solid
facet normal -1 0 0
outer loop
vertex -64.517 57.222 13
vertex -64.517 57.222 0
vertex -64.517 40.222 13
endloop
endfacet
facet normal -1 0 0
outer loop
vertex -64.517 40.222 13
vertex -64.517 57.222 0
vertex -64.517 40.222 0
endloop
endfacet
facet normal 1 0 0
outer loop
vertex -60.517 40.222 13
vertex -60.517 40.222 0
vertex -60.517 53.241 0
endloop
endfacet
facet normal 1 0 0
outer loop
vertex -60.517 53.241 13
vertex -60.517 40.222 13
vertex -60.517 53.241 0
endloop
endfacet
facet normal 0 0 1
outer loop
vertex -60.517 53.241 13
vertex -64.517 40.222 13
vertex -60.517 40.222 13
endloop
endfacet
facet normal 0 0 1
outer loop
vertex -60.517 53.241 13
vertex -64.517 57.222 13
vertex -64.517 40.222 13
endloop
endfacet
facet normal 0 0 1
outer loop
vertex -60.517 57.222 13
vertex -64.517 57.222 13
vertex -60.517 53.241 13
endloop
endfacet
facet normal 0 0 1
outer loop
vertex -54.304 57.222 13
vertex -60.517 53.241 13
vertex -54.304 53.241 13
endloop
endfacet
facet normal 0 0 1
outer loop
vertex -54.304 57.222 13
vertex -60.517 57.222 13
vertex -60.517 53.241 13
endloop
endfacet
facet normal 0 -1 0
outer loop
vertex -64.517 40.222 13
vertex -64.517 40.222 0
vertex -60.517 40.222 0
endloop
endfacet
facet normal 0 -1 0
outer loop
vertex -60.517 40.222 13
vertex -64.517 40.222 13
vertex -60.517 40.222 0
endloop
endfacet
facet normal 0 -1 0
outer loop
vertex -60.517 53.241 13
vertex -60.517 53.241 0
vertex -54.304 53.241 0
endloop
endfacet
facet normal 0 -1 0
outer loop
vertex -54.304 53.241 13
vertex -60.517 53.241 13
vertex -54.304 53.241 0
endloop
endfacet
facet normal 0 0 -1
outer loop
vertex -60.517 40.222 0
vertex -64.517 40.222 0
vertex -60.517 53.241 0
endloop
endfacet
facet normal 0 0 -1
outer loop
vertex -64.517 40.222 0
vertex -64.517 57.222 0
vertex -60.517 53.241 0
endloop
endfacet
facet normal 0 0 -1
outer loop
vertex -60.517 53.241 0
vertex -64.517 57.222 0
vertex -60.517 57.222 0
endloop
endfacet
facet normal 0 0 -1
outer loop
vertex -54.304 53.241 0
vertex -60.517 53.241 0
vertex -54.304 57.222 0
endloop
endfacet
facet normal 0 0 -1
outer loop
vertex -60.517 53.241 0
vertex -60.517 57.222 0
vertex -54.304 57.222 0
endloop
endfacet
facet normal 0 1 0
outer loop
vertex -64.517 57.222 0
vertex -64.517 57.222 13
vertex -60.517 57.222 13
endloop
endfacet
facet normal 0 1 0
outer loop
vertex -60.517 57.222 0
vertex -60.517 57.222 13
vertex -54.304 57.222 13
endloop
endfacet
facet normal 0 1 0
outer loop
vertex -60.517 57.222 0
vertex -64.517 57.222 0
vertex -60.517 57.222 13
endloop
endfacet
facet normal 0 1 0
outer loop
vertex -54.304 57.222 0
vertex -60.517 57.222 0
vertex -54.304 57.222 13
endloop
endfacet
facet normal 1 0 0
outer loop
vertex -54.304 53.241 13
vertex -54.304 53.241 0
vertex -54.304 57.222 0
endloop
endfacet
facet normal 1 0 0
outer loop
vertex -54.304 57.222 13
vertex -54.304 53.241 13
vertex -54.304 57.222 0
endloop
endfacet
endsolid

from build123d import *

# Parameters (mm, degrees)
F0_W     = 6.2131884992
F0_H     = 3.9810055999
F1_DEPTH = 13


with BuildPart() as f1:
    # F0 (on Top) → F1 (new body)
    with BuildSketch(Plane.XY):
        Polygon((-60.5168718398, 57.2218040137), (-64.5168718398, 57.2218040137), (-64.5168718398, 40.2218040137), (-60.5168718398, 40.2218040137), (-60.5168718398, 53.2407984138), align=None)
        with Locations((-57.4102775902, 55.2313012137)):
            Rectangle(F0_W, F0_H)
    extrude(amount=F1_DEPTH)


solid = f1.part
